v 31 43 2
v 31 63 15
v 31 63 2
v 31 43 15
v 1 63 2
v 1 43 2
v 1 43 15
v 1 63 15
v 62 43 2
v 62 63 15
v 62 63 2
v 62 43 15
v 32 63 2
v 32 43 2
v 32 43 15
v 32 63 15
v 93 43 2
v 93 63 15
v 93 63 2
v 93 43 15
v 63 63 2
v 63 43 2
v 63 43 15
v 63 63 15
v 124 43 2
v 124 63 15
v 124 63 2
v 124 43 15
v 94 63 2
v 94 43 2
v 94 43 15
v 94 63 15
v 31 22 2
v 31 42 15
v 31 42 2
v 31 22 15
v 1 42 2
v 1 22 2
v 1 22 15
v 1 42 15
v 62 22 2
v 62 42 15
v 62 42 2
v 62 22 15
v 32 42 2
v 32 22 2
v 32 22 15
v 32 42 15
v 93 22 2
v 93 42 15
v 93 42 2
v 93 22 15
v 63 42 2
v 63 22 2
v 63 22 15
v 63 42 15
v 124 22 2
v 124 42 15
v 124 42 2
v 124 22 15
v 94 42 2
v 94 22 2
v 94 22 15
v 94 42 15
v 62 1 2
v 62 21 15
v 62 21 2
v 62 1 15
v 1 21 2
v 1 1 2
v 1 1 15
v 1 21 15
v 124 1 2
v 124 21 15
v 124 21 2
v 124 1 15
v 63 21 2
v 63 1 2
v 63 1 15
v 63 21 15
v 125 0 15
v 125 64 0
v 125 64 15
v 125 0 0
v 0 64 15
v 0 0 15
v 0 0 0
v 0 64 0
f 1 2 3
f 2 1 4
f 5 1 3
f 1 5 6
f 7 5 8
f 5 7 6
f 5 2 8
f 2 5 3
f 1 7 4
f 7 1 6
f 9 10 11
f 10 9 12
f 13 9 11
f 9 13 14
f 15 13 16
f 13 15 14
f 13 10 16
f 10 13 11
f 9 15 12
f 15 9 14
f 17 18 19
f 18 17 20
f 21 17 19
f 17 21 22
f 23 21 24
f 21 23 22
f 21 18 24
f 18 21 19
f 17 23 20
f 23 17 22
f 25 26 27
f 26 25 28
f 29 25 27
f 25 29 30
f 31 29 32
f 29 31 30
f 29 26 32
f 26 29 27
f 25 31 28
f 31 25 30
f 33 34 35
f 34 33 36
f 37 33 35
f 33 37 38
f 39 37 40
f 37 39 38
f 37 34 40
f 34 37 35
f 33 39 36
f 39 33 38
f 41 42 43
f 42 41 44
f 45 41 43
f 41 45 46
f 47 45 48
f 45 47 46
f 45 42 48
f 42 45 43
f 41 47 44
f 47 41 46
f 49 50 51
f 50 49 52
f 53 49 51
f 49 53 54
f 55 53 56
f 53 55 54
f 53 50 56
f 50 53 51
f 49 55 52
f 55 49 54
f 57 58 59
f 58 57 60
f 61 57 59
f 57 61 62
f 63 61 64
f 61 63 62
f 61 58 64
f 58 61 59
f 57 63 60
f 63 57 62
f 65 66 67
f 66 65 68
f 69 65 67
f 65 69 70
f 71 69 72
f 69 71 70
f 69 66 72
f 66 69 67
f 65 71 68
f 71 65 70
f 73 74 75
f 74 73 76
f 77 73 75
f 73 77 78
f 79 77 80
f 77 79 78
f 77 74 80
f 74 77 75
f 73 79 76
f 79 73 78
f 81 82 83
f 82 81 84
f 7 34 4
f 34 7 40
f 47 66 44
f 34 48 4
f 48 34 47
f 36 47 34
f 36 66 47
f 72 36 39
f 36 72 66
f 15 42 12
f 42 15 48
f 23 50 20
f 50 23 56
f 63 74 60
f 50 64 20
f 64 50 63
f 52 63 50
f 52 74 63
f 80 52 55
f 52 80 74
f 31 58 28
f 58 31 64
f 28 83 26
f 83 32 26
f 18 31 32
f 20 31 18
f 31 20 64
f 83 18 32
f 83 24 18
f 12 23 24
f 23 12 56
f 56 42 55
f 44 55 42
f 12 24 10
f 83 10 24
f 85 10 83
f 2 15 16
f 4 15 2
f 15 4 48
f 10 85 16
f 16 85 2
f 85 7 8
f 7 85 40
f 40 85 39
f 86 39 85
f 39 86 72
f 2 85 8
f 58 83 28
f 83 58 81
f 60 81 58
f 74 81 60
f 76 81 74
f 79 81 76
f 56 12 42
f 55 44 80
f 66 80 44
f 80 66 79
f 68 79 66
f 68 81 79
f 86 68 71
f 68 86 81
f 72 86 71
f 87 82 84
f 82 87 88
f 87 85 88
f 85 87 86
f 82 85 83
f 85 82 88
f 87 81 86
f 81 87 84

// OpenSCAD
matrix=
[
	[1,1,1,1],
	[1,1,1,1],
	[2,2],
];

h=20;
w=30;

box_height=15;
box_layer=2;
box_wall=1;

box_size=[sumvec(matrix[0],len(matrix[0])), len(matrix)];


function sumvec(vector, index, sum=0) = 
	index == 0 ? 
		sum : 
		sumvec(vector, index-1, sum+vector[index-1]); // sums index amount of values in vector 


for (i = [0:len(matrix)-1])
{
	if (sumvec(matrix[i],len(matrix[i])) != box_size[0]) echo(i,"Not valid!");
}


module componentbox()
{
	difference()
	{
		cube([box_size[0] * (w + box_wall) + box_wall, box_size[1] * (h + box_wall) + box_wall, box_height]);

		#translate([0,0,box_layer])
		for (i = [0:box_size[1]-1])
		{
			translate([0,(box_size[1]-1-i) * (h+box_wall) + box_wall,0])
			for (j = [0:len(matrix[i])-1])
			{
				translate([sumvec(matrix[i],j) * (w+box_wall) + box_wall,0,0])
					cube([w * matrix[i][j] + box_wall * (matrix[i][j]-1), h,box_height]);
			}
		}
	}
}


componentbox();
